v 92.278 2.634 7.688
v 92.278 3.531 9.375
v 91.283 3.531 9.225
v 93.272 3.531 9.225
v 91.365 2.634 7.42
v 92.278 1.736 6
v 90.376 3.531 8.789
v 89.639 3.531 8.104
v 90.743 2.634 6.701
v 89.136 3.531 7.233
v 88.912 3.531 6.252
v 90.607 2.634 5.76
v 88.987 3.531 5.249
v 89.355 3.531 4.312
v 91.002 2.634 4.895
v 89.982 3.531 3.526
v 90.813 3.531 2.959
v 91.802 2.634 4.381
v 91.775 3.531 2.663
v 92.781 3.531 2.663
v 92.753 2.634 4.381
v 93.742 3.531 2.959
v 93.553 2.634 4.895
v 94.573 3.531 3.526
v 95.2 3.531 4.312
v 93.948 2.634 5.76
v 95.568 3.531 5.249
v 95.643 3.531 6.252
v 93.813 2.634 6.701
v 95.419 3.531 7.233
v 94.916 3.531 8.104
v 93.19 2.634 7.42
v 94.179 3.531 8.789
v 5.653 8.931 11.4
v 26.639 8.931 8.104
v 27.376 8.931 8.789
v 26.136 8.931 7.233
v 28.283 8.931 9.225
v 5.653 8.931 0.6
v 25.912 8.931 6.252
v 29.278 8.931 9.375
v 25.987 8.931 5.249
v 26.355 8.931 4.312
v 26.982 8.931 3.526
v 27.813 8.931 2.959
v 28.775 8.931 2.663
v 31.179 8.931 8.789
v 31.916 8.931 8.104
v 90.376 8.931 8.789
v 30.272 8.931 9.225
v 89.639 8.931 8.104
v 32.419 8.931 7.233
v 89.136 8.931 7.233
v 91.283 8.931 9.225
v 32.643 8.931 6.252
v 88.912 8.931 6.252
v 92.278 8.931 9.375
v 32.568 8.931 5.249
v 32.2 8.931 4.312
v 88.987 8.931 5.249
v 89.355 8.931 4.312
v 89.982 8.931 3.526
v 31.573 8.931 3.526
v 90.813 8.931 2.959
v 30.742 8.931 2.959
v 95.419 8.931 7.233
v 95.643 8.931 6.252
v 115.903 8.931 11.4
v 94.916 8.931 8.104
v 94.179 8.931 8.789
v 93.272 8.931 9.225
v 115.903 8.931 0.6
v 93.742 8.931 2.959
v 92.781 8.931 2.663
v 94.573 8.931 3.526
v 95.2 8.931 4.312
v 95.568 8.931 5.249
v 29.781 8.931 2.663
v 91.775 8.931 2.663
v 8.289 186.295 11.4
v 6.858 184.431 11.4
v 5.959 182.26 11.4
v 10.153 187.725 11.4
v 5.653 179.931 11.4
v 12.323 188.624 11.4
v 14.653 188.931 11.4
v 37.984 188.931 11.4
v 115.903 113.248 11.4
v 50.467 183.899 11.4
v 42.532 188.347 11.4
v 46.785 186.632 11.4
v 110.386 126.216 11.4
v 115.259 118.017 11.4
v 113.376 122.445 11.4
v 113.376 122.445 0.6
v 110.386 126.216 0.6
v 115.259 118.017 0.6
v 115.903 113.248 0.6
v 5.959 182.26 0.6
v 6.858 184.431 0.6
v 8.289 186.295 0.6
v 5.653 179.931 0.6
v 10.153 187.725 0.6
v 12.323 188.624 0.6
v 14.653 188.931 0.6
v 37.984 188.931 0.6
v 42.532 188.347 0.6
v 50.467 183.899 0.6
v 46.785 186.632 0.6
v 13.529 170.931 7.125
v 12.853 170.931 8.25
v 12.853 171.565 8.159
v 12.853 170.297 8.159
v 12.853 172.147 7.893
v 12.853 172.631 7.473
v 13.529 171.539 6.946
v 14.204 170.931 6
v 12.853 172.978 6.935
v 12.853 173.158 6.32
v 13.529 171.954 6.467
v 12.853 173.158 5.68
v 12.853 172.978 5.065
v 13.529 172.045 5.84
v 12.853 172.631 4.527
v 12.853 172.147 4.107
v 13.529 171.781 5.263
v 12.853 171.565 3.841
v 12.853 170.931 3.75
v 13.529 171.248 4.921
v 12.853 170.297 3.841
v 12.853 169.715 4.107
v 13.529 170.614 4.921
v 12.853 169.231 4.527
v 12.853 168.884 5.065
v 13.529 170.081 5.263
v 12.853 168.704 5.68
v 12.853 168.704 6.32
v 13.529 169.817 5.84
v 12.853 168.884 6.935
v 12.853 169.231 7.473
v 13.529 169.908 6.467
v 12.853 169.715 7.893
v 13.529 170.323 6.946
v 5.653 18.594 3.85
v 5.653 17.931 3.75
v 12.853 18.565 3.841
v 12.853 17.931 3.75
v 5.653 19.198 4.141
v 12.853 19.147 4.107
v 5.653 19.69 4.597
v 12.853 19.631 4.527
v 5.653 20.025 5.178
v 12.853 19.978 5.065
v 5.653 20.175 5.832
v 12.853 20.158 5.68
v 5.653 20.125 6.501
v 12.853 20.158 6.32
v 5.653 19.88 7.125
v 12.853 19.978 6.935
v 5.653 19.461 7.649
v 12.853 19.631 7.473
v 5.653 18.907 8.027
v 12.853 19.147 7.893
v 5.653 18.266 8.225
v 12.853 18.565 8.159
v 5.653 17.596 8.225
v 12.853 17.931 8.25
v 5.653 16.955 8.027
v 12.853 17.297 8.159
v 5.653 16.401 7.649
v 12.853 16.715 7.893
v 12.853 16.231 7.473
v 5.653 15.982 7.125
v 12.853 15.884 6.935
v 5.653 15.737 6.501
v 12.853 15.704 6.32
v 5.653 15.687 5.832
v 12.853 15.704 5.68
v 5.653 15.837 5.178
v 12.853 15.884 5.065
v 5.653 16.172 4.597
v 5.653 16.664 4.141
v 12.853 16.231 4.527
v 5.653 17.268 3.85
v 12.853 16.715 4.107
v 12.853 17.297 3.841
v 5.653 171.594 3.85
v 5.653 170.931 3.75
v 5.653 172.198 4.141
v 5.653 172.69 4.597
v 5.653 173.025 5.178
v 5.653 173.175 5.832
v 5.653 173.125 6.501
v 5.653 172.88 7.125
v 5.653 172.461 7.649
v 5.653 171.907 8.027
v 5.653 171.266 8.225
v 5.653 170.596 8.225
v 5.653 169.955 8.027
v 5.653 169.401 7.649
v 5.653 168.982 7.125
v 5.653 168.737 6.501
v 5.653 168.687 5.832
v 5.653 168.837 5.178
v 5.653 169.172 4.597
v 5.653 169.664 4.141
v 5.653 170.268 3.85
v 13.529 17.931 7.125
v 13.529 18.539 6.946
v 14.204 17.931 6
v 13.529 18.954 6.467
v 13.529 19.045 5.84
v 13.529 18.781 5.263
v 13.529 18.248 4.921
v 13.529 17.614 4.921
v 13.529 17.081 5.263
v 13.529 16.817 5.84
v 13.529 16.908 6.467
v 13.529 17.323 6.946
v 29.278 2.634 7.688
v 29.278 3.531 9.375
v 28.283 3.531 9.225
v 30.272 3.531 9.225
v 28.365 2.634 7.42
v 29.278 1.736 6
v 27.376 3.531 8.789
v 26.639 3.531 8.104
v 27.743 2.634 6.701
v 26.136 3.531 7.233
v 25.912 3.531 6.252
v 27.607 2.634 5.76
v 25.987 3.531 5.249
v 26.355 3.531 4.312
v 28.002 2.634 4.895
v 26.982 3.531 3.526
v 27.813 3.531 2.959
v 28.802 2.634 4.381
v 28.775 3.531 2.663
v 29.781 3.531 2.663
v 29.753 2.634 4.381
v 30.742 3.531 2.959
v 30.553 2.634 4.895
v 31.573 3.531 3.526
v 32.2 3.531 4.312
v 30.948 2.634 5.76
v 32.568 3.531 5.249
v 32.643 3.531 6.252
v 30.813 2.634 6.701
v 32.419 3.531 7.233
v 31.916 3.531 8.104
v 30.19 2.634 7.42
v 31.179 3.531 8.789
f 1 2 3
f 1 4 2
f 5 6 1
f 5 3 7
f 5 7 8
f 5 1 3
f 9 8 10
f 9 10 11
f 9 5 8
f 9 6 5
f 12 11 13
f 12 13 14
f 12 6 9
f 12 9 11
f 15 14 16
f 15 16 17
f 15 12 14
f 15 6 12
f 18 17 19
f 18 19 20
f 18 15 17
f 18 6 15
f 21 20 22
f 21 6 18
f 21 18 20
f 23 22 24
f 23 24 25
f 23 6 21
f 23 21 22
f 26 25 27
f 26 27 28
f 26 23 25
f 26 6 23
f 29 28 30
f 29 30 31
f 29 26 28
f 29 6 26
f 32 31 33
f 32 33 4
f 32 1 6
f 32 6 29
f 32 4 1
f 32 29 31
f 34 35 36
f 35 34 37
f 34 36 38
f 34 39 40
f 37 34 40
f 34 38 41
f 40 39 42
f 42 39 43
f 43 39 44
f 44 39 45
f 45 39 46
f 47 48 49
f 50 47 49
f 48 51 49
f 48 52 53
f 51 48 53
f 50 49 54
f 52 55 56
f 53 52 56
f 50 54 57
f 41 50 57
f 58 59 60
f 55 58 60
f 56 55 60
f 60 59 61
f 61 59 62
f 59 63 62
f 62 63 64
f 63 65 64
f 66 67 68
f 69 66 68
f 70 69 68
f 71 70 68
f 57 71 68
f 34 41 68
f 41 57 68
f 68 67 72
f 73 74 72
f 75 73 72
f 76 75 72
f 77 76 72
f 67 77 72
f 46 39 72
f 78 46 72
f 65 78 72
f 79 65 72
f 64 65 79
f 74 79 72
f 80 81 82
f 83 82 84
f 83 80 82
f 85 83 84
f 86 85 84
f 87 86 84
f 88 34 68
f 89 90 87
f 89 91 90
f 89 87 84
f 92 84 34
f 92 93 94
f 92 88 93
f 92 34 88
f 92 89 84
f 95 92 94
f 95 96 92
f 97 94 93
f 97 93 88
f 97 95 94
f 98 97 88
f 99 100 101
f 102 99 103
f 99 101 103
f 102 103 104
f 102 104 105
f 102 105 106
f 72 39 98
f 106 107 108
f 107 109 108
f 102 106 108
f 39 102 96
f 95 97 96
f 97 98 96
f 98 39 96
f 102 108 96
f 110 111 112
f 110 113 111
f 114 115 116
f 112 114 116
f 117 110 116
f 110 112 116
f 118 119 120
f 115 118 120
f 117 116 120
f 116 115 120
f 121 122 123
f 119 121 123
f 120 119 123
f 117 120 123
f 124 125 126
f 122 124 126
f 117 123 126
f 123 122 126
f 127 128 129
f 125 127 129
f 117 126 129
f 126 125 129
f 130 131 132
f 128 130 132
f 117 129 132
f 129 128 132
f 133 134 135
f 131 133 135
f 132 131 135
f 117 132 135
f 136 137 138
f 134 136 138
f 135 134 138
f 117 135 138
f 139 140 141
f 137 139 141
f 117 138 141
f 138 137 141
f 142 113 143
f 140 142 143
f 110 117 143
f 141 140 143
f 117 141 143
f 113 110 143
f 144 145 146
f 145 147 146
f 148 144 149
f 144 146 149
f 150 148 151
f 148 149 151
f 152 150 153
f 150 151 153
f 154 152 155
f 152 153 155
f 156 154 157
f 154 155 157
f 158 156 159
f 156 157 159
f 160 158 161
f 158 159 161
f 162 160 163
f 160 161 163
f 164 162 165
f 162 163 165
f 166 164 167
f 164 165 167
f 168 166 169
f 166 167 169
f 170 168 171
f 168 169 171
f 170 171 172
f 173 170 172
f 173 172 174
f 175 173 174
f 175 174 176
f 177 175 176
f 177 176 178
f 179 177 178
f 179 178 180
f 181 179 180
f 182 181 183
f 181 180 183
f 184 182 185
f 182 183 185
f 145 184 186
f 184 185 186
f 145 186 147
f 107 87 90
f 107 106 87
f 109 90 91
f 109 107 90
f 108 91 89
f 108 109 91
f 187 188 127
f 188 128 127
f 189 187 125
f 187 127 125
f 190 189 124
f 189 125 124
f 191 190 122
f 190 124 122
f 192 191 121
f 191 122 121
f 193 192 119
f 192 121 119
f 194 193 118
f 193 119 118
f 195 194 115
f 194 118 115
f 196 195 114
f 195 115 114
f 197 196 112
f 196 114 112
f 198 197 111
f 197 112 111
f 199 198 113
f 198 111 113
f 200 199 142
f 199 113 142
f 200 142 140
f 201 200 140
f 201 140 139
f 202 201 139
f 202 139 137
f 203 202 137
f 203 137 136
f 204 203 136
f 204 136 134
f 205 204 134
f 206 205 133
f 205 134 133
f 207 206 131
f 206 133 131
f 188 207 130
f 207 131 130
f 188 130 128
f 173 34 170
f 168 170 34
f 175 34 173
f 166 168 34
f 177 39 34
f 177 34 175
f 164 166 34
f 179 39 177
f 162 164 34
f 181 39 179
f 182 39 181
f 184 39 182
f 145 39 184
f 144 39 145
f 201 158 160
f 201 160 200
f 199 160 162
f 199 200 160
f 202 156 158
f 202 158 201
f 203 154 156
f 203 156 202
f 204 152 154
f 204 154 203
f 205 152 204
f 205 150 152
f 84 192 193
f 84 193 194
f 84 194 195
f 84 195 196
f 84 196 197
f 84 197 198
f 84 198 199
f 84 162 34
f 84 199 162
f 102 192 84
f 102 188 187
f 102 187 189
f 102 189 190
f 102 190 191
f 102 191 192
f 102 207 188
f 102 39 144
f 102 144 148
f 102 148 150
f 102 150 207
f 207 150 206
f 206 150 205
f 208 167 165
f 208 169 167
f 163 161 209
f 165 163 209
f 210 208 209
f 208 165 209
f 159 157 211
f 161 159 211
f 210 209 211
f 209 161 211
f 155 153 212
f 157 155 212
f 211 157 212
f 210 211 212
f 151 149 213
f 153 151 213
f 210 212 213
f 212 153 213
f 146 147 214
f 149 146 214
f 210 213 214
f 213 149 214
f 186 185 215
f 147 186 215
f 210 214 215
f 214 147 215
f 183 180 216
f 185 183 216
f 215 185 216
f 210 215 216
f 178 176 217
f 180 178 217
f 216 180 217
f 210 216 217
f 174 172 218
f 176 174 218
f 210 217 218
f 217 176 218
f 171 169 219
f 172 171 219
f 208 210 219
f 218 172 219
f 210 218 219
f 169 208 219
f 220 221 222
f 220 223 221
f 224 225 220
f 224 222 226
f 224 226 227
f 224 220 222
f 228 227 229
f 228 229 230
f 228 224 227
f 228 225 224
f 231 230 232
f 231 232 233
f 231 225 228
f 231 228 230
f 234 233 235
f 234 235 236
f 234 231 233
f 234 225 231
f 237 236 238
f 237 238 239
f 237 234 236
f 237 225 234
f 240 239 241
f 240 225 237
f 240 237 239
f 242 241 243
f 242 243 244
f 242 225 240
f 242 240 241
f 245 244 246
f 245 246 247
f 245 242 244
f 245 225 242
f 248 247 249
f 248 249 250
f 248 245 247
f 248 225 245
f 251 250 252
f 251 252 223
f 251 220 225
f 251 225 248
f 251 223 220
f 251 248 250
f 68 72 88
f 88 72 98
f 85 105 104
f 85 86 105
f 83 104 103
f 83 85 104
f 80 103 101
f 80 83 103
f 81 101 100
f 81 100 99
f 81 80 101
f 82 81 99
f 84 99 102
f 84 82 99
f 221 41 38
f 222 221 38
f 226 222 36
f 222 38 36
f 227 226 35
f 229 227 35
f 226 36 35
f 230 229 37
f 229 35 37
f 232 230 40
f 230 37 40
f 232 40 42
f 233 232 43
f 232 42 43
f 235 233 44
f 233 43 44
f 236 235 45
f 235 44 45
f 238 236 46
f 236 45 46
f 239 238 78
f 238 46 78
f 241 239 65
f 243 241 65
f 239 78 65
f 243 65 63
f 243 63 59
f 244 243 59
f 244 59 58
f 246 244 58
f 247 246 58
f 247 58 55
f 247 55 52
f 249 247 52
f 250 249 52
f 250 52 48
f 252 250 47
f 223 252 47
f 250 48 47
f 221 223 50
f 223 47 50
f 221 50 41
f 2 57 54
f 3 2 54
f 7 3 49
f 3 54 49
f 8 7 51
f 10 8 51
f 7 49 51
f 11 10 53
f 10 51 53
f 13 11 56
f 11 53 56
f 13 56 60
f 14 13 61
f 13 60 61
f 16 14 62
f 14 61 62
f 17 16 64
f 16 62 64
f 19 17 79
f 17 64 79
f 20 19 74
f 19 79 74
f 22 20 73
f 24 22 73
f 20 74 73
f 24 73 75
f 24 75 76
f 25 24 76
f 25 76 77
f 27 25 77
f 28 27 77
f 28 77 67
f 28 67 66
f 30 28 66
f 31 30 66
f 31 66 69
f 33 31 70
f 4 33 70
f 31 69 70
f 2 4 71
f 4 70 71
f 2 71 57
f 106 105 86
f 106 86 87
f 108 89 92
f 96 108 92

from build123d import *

# Parameters (mm, degrees)
SKETCH4_W                    = 122.5
SKETCH4_H                    = 200
BOSS_EXTRUDE1_DEPTH          = 12
CUT_EXTRUDE1_DEPTH           = 12
FILLET1_R                    = 20
FILLET2_R                    = 20
FILLET3_R                    = 10
SKETCH10_R                   = 3.75
BOSS_EXTRUDE3_DEPTH          = 6
F_5_0_5_DIAMETER_HOLE1_D     = 5
F_5_0_5_DIAMETER_HOLE1_DEPTH = 8
F_5_0_5_DIAMETER_HOLE1_TIP   = 1.502151548
F_5_0_5_DIAMETER_HOLE2_D     = 5
F_5_0_5_DIAMETER_HOLE2_DEPTH = 8
F_5_0_5_DIAMETER_HOLE2_TIP   = 1.502151548
SCALE1_SCALE                 = 0.9


with BuildPart() as part:
    # Sketch4 → Boss-Extrude1 (new body)
    with BuildSketch(Plane.XY):
        with Locations((61.25, 100)):
            Rectangle(SKETCH4_W, SKETCH4_H)
    extrude(amount=BOSS_EXTRUDE1_DEPTH)

    # Sketch7 → Cut-Extrude1 (cut)
    with BuildSketch(Plane.XY.offset(12)):
        Polygon((43.985796602, 200), (122.5, 124.415794753), (122.5, 200), align=None)
    extrude(amount=-CUT_EXTRUDE1_DEPTH, mode=Mode.SUBTRACT)

    # Fillet1
    fillet1_edges = [part.edges().sort_by_distance(p)[0] for p in [
        (43.985796602, 200, 6),
    ]]
    fillet(fillet1_edges, radius=FILLET1_R)

    # Fillet2
    fillet2_edges = [part.edges().sort_by_distance(p)[0] for p in [
        (122.5, 124.415794753, 6),
    ]]
    fillet(fillet2_edges, radius=FILLET2_R)

    # Fillet3
    fillet3_edges = [part.edges().sort_by_distance(p)[0] for p in [
        (0, 200, 6),
    ]]
    fillet(fillet3_edges, radius=FILLET3_R)

    # Sketch10 → Boss-Extrude3 (add)
    with BuildSketch(Plane.XZ):
        with Locations(Location((26.25, 6, 0), (0, 0, 90))):
            Circle(SKETCH10_R)
        with Locations(Location((96.25, 6, 0), (0, 0, 90))):
            Circle(SKETCH10_R)
    extrude(amount=BOSS_EXTRUDE3_DEPTH)

    # Boss-Extrude4 cone 1 section (through the dimple's axis) → Boss-Extrude4 (revolve)
    with BuildSketch(Plane(origin=(26.25, -6, 6), x_dir=(0, 0, 1), z_dir=(1, 0, 0))):
        Polygon((0, 0), (3.75, 0), (0, 1.993910369), align=None)
    revolve(axis=Axis((26.25, -6, 6), (0, -1, 0)))

    # Boss-Extrude4 cone 2 section (through the dimple's axis) → Boss-Extrude4 cone 2 (revolve)
    with BuildSketch(Plane(origin=(96.25, -6, 6), x_dir=(0, 0, 1), z_dir=(1, 0, 0))):
        Polygon((0, 0), (3.75, 0), (0, 1.993910369), align=None)
    revolve(axis=Axis((96.25, -6, 6), (0, -1, 0)))

    # Ø5.0 (5) Diameter Hole1
    with Locations(Plane.ZY):
        with Locations((6, 180)):
            Hole(F_5_0_5_DIAMETER_HOLE1_D / 2, depth=F_5_0_5_DIAMETER_HOLE1_DEPTH)
            with Locations((0, 0, -(F_5_0_5_DIAMETER_HOLE1_DEPTH + F_5_0_5_DIAMETER_HOLE1_TIP / 2))):  # 118° drill point
                Cone(0, F_5_0_5_DIAMETER_HOLE1_D / 2, F_5_0_5_DIAMETER_HOLE1_TIP, mode=Mode.SUBTRACT)

    # Ø5.0 (5) Diameter Hole2
    with Locations(Plane.ZY):
        with Locations((6, 10)):
            Hole(F_5_0_5_DIAMETER_HOLE2_D / 2, depth=F_5_0_5_DIAMETER_HOLE2_DEPTH)
            with Locations((0, 0, -(F_5_0_5_DIAMETER_HOLE2_DEPTH + F_5_0_5_DIAMETER_HOLE2_TIP / 2))):  # 118° drill point
                Cone(0, F_5_0_5_DIAMETER_HOLE2_D / 2, F_5_0_5_DIAMETER_HOLE2_TIP, mode=Mode.SUBTRACT)


with BuildPart() as part_1:
    # Scale1: scaled about (56.525506998, 89.309787592, 6)
    add(part.part.scale(SCALE1_SCALE).moved(Location((5.6525507, 8.930978759, 0.6))))


solid = part_1.part
